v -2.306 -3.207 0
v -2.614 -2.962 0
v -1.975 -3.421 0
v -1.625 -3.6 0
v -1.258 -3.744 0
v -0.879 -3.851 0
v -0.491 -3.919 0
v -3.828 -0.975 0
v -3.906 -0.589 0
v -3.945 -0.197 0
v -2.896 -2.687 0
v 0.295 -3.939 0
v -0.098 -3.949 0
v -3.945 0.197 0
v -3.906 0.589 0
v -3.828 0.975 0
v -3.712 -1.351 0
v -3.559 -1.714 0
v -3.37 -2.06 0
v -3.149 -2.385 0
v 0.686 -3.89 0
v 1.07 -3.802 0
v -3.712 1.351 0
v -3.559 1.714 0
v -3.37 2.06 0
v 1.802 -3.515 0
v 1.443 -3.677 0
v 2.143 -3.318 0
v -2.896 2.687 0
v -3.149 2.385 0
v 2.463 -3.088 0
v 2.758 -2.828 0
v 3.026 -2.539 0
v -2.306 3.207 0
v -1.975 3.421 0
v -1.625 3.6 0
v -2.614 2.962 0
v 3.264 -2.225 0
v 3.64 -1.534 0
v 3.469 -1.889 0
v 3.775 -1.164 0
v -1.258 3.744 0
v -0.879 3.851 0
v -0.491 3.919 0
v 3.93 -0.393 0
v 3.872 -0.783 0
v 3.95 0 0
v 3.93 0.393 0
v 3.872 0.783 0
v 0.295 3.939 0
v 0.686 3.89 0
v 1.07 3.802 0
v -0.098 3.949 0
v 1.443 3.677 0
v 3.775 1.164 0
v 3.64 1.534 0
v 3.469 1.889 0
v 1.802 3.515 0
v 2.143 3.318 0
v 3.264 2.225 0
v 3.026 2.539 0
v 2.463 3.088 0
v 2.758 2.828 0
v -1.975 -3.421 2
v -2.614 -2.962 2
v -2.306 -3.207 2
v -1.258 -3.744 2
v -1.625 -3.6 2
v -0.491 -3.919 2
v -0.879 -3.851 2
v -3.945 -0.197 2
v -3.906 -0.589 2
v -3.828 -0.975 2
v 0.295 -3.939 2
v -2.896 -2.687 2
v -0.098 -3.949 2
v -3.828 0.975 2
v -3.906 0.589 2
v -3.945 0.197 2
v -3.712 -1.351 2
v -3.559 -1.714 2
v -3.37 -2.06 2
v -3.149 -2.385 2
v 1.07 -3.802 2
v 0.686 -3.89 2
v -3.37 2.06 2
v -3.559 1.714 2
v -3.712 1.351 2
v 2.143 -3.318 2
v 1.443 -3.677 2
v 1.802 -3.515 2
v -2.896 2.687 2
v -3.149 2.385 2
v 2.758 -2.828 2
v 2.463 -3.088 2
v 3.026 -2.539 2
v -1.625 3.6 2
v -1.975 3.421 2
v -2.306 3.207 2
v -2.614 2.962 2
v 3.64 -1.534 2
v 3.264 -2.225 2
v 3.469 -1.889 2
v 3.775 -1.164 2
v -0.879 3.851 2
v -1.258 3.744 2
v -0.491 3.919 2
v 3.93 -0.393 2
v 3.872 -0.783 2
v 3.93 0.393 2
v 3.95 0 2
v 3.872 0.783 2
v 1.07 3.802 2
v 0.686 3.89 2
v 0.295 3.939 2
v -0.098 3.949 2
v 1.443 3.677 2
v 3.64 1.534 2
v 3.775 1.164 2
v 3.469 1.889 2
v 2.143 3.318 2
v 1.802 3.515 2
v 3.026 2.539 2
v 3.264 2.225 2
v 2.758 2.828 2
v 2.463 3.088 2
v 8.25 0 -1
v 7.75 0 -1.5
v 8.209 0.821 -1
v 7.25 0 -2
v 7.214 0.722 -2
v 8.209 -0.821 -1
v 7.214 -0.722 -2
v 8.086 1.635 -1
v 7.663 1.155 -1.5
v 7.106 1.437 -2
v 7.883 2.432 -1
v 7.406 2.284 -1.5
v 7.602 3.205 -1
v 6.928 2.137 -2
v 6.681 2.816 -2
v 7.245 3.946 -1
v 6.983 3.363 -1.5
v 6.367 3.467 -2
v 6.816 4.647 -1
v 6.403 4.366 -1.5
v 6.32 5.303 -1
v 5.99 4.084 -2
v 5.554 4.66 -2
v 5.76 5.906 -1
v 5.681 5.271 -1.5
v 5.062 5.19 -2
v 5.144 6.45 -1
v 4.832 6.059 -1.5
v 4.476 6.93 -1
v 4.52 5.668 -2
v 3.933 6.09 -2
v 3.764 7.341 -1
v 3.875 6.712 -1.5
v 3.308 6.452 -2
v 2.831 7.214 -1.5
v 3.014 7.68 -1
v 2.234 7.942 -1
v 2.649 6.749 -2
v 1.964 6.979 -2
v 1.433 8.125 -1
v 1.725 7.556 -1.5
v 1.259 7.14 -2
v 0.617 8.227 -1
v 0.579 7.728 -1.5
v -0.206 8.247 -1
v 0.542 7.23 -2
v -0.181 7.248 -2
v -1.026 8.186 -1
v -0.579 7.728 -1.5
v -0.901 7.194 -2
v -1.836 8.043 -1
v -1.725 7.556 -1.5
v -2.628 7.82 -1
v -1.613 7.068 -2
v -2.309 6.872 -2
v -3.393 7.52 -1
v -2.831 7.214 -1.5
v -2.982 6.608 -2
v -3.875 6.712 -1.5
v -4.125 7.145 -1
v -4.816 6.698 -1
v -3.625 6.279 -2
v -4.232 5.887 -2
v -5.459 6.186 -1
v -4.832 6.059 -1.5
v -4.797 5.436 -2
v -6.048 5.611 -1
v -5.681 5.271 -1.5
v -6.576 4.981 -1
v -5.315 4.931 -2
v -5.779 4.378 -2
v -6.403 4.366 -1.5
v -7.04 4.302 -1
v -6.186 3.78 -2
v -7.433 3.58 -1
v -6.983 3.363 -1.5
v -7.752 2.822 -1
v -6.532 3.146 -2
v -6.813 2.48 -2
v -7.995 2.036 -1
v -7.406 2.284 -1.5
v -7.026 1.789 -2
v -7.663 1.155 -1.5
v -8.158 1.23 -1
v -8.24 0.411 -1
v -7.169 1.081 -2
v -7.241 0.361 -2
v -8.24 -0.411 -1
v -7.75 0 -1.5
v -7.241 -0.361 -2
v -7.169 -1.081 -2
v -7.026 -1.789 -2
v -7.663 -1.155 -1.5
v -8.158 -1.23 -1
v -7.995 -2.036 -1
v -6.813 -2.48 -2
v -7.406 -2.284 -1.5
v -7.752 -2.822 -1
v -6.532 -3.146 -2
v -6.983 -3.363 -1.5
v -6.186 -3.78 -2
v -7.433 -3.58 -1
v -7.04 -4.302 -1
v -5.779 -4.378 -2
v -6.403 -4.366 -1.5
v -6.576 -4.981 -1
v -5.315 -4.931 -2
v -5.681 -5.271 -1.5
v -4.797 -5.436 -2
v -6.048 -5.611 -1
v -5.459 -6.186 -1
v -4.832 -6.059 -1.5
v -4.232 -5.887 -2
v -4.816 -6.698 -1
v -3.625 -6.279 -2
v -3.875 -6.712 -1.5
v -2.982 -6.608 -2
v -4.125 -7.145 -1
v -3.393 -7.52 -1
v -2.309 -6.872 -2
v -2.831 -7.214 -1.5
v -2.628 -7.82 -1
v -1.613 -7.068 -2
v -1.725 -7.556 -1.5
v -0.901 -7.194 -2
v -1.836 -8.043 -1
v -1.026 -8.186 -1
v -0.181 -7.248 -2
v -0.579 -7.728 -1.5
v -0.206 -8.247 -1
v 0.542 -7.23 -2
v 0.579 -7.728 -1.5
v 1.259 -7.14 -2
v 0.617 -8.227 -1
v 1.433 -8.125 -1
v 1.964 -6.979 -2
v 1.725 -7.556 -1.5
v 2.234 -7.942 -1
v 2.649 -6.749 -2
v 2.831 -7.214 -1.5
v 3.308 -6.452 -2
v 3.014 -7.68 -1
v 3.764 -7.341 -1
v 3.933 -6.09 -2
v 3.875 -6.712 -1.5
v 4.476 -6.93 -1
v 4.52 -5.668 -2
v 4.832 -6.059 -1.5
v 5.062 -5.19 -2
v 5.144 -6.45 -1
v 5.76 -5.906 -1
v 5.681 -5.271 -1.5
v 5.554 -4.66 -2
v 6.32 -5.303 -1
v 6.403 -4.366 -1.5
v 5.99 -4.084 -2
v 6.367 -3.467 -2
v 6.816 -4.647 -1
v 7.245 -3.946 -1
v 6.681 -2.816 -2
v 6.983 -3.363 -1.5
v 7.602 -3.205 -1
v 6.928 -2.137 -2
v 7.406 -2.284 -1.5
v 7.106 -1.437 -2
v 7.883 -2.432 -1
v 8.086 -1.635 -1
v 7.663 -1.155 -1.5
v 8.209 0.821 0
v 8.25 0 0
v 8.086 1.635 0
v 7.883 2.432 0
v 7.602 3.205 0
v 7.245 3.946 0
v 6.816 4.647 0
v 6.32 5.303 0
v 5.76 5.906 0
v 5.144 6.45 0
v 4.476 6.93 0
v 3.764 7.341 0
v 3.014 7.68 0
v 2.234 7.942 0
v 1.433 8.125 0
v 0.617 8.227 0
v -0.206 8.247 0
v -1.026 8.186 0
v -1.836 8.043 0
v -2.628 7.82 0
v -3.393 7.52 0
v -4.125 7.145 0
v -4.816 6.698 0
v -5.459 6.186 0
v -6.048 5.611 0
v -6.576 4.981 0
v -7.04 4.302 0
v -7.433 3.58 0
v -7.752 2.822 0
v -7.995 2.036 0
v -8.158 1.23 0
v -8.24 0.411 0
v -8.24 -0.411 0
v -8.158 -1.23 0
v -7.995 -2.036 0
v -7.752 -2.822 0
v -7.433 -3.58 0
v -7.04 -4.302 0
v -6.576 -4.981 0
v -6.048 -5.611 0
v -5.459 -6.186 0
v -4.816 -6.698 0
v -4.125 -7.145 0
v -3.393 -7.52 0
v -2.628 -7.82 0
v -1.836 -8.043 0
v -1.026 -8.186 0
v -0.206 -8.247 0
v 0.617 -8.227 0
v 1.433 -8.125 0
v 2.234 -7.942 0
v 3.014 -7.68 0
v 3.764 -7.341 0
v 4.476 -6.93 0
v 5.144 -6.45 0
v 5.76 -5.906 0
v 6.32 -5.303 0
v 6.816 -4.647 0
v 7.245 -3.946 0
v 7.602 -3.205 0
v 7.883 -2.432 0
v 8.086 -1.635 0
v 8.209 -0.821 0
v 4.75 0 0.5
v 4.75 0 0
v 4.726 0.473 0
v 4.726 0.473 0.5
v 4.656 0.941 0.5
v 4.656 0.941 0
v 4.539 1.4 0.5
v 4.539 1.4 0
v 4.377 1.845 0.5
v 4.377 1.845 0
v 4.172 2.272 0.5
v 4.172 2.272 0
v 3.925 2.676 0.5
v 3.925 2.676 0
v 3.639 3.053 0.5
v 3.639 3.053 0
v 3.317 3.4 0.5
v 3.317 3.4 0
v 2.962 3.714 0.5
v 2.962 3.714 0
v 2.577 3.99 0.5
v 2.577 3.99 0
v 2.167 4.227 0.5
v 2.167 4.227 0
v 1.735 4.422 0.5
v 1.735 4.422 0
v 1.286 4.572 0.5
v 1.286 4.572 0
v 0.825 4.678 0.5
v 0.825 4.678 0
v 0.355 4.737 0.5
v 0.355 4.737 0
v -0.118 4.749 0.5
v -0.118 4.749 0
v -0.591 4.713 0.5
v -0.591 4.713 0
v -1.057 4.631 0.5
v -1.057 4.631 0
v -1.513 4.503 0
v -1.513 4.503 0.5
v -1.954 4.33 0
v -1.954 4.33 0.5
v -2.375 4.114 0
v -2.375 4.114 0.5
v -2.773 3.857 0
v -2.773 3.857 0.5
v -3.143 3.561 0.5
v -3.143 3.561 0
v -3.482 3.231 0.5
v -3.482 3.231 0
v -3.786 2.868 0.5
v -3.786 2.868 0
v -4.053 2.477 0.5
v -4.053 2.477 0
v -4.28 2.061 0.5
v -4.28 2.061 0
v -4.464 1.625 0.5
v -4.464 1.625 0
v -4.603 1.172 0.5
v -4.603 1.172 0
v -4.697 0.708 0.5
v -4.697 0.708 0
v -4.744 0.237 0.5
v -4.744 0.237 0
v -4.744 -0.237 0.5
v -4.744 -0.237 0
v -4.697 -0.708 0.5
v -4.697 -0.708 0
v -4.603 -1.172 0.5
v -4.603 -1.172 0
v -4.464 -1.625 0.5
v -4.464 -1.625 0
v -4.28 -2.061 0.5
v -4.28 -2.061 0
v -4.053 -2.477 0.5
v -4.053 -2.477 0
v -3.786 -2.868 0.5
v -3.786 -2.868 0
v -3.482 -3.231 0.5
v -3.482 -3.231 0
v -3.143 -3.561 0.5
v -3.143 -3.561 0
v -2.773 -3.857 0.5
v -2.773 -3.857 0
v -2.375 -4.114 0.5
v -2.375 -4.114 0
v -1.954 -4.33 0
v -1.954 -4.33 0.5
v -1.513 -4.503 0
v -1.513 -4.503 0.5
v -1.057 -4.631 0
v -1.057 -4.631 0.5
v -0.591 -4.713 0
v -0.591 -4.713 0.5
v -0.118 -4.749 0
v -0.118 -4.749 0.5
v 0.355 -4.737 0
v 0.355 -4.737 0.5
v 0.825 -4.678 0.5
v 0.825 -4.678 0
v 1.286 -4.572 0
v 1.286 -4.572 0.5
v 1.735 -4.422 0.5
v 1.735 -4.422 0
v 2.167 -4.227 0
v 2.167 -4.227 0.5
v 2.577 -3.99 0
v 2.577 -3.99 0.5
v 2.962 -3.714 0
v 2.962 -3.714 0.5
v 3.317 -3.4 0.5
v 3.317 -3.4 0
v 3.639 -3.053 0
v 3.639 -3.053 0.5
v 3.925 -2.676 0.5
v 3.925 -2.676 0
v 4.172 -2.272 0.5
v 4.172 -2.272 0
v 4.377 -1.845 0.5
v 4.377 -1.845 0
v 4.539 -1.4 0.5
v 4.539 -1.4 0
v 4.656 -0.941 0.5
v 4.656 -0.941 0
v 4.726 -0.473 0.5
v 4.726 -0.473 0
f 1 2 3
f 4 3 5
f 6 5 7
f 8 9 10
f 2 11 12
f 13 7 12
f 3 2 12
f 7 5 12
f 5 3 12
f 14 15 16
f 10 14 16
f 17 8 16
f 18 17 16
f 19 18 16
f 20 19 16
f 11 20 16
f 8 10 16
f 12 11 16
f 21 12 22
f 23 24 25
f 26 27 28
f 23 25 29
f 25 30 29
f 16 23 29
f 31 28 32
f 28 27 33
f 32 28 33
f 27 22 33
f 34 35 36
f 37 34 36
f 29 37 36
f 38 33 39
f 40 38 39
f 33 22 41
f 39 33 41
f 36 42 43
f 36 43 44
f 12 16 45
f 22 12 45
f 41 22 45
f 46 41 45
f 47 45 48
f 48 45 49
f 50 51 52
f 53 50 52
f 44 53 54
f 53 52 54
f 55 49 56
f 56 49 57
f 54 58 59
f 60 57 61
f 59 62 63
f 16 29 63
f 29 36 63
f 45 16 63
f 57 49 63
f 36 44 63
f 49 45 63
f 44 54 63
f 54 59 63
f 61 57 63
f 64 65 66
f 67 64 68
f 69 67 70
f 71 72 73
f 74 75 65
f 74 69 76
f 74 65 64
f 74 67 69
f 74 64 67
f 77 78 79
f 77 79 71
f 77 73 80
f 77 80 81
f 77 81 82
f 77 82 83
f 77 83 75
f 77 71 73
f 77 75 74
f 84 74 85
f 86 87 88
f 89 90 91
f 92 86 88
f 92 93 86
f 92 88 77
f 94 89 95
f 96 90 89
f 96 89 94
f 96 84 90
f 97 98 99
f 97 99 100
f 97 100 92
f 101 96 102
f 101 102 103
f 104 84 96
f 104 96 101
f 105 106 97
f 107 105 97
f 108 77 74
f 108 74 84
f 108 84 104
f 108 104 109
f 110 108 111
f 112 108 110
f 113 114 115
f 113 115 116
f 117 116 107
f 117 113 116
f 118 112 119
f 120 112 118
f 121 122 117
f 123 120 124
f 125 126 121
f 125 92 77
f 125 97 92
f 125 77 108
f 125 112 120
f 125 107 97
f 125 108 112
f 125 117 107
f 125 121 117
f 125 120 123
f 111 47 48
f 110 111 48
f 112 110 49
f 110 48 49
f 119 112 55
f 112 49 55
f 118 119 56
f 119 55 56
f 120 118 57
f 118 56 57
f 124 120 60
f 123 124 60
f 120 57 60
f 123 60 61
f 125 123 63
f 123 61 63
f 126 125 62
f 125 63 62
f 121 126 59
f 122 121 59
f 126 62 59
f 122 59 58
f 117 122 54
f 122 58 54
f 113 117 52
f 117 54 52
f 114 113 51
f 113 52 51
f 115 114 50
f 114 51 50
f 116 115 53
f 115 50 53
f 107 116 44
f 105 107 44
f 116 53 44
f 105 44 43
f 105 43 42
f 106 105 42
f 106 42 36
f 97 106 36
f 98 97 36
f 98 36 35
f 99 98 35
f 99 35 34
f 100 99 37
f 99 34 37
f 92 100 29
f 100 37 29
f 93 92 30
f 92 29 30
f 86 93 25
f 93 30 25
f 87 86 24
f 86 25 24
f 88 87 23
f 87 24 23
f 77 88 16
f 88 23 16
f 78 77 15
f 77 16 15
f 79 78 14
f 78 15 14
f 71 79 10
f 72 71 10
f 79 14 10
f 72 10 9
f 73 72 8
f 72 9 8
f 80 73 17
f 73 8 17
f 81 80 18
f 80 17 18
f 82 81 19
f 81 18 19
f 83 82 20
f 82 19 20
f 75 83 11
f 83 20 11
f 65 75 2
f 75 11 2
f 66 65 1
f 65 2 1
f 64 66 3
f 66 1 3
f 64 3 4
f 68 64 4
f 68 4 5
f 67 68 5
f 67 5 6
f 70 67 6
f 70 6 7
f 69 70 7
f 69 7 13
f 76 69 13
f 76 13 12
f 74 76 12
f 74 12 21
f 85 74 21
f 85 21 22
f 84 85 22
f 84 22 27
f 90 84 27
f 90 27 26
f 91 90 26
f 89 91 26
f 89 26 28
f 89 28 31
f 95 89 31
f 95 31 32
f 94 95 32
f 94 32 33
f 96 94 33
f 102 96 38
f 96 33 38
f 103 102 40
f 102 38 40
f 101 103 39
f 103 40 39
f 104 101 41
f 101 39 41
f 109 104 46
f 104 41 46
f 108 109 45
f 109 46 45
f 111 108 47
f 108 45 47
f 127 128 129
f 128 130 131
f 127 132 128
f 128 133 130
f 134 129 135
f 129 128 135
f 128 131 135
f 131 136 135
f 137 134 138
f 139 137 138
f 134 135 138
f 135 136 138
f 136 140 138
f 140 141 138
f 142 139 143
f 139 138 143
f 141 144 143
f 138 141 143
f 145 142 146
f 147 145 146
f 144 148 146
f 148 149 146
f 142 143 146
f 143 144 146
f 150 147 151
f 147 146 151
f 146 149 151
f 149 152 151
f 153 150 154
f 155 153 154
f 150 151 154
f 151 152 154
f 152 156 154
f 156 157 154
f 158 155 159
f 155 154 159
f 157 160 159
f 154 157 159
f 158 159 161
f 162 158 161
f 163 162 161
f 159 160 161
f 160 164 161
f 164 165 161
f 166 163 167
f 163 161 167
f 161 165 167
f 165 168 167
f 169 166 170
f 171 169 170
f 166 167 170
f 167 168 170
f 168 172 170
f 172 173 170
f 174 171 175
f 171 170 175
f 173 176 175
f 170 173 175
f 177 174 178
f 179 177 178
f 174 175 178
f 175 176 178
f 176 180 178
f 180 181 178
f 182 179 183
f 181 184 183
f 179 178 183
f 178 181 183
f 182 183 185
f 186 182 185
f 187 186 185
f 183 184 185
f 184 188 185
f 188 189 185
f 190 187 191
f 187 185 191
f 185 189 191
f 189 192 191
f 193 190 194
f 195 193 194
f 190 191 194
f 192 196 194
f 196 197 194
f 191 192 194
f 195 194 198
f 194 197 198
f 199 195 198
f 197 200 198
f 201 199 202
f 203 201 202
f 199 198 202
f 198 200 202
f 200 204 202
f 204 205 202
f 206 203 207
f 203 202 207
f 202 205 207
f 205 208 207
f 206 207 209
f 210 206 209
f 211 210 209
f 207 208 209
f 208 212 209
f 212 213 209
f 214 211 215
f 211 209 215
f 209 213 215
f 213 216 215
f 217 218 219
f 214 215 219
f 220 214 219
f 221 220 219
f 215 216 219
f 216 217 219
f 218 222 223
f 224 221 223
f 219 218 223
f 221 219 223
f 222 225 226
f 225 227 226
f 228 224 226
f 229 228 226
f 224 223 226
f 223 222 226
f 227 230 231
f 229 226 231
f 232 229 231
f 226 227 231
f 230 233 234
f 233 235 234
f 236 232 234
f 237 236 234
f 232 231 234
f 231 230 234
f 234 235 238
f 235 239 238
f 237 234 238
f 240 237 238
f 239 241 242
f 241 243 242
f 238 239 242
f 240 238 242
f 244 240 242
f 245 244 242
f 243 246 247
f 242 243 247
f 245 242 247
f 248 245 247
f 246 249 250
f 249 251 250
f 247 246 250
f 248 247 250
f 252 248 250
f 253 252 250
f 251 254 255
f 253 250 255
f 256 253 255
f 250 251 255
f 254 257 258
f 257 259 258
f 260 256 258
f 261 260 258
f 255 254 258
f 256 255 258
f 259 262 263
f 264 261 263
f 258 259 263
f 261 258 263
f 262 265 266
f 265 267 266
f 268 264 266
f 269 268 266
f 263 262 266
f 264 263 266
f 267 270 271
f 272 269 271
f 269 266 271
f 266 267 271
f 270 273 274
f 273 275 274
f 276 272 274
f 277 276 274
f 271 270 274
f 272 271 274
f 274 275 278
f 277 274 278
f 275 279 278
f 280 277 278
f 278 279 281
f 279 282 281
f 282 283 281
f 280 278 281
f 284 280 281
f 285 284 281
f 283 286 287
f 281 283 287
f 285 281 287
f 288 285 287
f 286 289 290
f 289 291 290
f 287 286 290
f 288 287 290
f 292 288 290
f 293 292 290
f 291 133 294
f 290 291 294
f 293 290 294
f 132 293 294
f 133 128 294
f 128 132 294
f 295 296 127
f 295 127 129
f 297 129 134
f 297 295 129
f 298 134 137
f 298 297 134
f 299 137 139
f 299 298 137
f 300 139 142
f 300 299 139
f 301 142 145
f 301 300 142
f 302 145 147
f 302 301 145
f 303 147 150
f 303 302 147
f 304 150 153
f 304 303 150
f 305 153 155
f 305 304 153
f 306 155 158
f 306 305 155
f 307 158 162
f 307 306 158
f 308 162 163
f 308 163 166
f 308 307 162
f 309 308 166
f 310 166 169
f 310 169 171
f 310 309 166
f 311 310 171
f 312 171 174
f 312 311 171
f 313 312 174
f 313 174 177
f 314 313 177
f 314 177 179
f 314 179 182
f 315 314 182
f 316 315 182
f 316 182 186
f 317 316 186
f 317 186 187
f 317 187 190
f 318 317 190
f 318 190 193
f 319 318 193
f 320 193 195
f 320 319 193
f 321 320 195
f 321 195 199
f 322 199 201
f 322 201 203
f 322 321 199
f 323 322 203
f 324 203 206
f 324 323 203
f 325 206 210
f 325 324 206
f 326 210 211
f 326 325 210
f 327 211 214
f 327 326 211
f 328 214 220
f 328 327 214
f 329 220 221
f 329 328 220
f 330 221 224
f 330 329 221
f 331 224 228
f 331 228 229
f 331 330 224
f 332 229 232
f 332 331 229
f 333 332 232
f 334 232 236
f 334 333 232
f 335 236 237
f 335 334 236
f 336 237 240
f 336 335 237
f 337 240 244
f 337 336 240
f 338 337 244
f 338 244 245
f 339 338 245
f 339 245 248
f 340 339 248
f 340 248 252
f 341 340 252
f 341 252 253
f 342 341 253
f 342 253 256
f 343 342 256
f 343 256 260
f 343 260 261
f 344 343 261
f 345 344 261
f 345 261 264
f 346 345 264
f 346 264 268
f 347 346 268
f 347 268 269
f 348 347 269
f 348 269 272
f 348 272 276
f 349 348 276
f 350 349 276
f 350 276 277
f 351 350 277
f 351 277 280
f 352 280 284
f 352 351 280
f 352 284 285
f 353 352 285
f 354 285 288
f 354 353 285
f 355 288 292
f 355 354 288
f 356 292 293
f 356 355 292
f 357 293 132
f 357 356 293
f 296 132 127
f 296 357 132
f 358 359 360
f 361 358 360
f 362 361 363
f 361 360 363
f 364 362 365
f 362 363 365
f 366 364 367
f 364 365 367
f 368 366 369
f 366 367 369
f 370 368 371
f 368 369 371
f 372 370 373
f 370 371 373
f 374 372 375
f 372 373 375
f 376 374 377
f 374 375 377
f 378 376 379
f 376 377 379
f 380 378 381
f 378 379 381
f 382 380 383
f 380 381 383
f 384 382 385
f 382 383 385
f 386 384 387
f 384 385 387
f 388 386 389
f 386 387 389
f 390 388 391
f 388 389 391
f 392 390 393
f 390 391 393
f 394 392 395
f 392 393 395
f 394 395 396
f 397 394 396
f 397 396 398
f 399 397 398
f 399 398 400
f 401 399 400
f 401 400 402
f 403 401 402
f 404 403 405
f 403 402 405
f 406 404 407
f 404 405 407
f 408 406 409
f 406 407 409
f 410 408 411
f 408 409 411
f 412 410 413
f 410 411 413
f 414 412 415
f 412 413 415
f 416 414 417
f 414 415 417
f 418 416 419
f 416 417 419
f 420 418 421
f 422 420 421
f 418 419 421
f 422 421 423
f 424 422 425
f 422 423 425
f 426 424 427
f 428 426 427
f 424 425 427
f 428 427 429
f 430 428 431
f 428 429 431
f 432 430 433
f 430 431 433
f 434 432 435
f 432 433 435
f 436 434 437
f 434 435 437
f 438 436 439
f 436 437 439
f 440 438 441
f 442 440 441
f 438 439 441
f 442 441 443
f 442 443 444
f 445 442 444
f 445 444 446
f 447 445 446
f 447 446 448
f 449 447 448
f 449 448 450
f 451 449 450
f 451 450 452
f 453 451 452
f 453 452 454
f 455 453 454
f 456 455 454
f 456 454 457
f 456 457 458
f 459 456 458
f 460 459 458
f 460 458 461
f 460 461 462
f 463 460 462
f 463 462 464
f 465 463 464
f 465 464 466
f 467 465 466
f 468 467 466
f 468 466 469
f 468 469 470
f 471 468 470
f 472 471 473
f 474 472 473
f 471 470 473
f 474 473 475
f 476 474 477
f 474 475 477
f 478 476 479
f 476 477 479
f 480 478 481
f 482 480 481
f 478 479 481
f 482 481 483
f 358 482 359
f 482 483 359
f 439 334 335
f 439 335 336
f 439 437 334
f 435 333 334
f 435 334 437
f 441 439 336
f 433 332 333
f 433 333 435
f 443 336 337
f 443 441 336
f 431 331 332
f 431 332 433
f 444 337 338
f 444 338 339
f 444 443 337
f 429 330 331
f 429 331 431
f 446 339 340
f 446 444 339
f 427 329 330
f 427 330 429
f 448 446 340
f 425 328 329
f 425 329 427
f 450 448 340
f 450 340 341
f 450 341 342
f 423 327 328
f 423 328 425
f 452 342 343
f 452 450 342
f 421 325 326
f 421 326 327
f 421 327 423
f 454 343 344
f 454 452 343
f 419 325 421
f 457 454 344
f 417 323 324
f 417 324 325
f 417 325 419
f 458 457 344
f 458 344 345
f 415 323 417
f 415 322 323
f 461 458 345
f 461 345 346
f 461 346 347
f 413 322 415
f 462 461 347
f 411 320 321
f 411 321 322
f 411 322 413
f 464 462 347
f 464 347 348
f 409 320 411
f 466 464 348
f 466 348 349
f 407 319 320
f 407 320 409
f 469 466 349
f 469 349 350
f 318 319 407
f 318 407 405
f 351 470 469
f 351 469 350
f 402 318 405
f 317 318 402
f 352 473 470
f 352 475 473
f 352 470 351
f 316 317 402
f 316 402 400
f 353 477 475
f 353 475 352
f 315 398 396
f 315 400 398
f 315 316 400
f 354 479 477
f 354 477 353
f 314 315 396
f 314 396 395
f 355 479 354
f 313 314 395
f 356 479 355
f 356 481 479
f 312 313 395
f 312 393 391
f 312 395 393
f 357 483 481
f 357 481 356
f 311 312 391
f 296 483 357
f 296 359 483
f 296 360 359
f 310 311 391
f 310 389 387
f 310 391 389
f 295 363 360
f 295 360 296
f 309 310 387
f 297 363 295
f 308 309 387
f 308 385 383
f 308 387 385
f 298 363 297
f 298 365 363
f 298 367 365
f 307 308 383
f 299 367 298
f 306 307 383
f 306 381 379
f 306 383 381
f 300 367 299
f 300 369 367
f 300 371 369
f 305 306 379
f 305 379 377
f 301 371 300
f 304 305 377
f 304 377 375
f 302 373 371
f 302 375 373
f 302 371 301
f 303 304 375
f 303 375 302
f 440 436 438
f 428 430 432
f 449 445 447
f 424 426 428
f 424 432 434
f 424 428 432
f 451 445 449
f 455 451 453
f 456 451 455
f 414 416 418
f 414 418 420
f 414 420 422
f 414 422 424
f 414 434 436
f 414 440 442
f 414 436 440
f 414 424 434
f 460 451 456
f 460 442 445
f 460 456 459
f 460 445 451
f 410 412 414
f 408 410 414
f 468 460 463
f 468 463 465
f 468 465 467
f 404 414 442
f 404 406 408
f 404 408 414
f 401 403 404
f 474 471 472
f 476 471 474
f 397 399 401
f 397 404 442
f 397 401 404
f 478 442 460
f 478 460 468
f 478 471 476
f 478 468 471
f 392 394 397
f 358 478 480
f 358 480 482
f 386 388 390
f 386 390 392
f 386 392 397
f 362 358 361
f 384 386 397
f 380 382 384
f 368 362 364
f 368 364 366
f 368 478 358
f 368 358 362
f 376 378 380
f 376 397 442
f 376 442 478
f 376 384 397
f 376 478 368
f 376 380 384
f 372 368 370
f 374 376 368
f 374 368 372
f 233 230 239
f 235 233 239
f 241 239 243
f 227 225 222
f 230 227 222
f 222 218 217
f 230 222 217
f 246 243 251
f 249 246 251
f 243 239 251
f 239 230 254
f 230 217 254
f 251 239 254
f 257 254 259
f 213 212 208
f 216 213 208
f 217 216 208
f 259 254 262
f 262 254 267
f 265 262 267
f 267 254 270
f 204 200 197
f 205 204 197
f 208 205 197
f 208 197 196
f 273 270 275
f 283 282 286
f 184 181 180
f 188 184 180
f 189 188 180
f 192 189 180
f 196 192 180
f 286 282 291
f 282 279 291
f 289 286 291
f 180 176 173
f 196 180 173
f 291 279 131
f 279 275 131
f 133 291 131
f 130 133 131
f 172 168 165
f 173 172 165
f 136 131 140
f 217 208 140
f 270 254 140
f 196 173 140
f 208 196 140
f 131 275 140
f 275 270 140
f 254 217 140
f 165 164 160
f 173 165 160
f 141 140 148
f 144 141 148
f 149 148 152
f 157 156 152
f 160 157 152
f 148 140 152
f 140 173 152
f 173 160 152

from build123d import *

# Parameters (mm, degrees)
F0_R     = 3.95
F1_DEPTH = 2
F0_R_2   = 8.25
F0_R_3   = 4.75
F2_DEPTH = 2
F3_DEPTH = 0.5
F4_SIZE  = 1


with BuildPart() as f1:
    # F0 (on Top) → F1 (new body)
    with BuildSketch(Plane.XY):
        Circle(F0_R)
    extrude(amount=F1_DEPTH)


with BuildPart() as f2:
    # F0 (on Top) → F2 (new body)
    with BuildSketch(Plane.XY):
        Circle(F0_R_2)
        Circle(F0_R_3, mode=Mode.SUBTRACT)
        Circle(F0_R_3)
        Circle(F0_R, mode=Mode.SUBTRACT)
        Circle(F0_R)
    extrude(amount=-F2_DEPTH)

    # F0 (on Top) → F3 (join)
    with BuildSketch(Plane.XY):
        Circle(F0_R_3)
        Circle(F0_R, mode=Mode.SUBTRACT)
        Circle(F0_R)
    extrude(amount=F3_DEPTH)

    # F4
    f4_edges = [f2.edges().sort_by_distance(p)[0] for p in [
        (-8.25, 0, -2),
    ]]
    chamfer(f4_edges, length=F4_SIZE)


solid = Compound([f1.part, f2.part])
